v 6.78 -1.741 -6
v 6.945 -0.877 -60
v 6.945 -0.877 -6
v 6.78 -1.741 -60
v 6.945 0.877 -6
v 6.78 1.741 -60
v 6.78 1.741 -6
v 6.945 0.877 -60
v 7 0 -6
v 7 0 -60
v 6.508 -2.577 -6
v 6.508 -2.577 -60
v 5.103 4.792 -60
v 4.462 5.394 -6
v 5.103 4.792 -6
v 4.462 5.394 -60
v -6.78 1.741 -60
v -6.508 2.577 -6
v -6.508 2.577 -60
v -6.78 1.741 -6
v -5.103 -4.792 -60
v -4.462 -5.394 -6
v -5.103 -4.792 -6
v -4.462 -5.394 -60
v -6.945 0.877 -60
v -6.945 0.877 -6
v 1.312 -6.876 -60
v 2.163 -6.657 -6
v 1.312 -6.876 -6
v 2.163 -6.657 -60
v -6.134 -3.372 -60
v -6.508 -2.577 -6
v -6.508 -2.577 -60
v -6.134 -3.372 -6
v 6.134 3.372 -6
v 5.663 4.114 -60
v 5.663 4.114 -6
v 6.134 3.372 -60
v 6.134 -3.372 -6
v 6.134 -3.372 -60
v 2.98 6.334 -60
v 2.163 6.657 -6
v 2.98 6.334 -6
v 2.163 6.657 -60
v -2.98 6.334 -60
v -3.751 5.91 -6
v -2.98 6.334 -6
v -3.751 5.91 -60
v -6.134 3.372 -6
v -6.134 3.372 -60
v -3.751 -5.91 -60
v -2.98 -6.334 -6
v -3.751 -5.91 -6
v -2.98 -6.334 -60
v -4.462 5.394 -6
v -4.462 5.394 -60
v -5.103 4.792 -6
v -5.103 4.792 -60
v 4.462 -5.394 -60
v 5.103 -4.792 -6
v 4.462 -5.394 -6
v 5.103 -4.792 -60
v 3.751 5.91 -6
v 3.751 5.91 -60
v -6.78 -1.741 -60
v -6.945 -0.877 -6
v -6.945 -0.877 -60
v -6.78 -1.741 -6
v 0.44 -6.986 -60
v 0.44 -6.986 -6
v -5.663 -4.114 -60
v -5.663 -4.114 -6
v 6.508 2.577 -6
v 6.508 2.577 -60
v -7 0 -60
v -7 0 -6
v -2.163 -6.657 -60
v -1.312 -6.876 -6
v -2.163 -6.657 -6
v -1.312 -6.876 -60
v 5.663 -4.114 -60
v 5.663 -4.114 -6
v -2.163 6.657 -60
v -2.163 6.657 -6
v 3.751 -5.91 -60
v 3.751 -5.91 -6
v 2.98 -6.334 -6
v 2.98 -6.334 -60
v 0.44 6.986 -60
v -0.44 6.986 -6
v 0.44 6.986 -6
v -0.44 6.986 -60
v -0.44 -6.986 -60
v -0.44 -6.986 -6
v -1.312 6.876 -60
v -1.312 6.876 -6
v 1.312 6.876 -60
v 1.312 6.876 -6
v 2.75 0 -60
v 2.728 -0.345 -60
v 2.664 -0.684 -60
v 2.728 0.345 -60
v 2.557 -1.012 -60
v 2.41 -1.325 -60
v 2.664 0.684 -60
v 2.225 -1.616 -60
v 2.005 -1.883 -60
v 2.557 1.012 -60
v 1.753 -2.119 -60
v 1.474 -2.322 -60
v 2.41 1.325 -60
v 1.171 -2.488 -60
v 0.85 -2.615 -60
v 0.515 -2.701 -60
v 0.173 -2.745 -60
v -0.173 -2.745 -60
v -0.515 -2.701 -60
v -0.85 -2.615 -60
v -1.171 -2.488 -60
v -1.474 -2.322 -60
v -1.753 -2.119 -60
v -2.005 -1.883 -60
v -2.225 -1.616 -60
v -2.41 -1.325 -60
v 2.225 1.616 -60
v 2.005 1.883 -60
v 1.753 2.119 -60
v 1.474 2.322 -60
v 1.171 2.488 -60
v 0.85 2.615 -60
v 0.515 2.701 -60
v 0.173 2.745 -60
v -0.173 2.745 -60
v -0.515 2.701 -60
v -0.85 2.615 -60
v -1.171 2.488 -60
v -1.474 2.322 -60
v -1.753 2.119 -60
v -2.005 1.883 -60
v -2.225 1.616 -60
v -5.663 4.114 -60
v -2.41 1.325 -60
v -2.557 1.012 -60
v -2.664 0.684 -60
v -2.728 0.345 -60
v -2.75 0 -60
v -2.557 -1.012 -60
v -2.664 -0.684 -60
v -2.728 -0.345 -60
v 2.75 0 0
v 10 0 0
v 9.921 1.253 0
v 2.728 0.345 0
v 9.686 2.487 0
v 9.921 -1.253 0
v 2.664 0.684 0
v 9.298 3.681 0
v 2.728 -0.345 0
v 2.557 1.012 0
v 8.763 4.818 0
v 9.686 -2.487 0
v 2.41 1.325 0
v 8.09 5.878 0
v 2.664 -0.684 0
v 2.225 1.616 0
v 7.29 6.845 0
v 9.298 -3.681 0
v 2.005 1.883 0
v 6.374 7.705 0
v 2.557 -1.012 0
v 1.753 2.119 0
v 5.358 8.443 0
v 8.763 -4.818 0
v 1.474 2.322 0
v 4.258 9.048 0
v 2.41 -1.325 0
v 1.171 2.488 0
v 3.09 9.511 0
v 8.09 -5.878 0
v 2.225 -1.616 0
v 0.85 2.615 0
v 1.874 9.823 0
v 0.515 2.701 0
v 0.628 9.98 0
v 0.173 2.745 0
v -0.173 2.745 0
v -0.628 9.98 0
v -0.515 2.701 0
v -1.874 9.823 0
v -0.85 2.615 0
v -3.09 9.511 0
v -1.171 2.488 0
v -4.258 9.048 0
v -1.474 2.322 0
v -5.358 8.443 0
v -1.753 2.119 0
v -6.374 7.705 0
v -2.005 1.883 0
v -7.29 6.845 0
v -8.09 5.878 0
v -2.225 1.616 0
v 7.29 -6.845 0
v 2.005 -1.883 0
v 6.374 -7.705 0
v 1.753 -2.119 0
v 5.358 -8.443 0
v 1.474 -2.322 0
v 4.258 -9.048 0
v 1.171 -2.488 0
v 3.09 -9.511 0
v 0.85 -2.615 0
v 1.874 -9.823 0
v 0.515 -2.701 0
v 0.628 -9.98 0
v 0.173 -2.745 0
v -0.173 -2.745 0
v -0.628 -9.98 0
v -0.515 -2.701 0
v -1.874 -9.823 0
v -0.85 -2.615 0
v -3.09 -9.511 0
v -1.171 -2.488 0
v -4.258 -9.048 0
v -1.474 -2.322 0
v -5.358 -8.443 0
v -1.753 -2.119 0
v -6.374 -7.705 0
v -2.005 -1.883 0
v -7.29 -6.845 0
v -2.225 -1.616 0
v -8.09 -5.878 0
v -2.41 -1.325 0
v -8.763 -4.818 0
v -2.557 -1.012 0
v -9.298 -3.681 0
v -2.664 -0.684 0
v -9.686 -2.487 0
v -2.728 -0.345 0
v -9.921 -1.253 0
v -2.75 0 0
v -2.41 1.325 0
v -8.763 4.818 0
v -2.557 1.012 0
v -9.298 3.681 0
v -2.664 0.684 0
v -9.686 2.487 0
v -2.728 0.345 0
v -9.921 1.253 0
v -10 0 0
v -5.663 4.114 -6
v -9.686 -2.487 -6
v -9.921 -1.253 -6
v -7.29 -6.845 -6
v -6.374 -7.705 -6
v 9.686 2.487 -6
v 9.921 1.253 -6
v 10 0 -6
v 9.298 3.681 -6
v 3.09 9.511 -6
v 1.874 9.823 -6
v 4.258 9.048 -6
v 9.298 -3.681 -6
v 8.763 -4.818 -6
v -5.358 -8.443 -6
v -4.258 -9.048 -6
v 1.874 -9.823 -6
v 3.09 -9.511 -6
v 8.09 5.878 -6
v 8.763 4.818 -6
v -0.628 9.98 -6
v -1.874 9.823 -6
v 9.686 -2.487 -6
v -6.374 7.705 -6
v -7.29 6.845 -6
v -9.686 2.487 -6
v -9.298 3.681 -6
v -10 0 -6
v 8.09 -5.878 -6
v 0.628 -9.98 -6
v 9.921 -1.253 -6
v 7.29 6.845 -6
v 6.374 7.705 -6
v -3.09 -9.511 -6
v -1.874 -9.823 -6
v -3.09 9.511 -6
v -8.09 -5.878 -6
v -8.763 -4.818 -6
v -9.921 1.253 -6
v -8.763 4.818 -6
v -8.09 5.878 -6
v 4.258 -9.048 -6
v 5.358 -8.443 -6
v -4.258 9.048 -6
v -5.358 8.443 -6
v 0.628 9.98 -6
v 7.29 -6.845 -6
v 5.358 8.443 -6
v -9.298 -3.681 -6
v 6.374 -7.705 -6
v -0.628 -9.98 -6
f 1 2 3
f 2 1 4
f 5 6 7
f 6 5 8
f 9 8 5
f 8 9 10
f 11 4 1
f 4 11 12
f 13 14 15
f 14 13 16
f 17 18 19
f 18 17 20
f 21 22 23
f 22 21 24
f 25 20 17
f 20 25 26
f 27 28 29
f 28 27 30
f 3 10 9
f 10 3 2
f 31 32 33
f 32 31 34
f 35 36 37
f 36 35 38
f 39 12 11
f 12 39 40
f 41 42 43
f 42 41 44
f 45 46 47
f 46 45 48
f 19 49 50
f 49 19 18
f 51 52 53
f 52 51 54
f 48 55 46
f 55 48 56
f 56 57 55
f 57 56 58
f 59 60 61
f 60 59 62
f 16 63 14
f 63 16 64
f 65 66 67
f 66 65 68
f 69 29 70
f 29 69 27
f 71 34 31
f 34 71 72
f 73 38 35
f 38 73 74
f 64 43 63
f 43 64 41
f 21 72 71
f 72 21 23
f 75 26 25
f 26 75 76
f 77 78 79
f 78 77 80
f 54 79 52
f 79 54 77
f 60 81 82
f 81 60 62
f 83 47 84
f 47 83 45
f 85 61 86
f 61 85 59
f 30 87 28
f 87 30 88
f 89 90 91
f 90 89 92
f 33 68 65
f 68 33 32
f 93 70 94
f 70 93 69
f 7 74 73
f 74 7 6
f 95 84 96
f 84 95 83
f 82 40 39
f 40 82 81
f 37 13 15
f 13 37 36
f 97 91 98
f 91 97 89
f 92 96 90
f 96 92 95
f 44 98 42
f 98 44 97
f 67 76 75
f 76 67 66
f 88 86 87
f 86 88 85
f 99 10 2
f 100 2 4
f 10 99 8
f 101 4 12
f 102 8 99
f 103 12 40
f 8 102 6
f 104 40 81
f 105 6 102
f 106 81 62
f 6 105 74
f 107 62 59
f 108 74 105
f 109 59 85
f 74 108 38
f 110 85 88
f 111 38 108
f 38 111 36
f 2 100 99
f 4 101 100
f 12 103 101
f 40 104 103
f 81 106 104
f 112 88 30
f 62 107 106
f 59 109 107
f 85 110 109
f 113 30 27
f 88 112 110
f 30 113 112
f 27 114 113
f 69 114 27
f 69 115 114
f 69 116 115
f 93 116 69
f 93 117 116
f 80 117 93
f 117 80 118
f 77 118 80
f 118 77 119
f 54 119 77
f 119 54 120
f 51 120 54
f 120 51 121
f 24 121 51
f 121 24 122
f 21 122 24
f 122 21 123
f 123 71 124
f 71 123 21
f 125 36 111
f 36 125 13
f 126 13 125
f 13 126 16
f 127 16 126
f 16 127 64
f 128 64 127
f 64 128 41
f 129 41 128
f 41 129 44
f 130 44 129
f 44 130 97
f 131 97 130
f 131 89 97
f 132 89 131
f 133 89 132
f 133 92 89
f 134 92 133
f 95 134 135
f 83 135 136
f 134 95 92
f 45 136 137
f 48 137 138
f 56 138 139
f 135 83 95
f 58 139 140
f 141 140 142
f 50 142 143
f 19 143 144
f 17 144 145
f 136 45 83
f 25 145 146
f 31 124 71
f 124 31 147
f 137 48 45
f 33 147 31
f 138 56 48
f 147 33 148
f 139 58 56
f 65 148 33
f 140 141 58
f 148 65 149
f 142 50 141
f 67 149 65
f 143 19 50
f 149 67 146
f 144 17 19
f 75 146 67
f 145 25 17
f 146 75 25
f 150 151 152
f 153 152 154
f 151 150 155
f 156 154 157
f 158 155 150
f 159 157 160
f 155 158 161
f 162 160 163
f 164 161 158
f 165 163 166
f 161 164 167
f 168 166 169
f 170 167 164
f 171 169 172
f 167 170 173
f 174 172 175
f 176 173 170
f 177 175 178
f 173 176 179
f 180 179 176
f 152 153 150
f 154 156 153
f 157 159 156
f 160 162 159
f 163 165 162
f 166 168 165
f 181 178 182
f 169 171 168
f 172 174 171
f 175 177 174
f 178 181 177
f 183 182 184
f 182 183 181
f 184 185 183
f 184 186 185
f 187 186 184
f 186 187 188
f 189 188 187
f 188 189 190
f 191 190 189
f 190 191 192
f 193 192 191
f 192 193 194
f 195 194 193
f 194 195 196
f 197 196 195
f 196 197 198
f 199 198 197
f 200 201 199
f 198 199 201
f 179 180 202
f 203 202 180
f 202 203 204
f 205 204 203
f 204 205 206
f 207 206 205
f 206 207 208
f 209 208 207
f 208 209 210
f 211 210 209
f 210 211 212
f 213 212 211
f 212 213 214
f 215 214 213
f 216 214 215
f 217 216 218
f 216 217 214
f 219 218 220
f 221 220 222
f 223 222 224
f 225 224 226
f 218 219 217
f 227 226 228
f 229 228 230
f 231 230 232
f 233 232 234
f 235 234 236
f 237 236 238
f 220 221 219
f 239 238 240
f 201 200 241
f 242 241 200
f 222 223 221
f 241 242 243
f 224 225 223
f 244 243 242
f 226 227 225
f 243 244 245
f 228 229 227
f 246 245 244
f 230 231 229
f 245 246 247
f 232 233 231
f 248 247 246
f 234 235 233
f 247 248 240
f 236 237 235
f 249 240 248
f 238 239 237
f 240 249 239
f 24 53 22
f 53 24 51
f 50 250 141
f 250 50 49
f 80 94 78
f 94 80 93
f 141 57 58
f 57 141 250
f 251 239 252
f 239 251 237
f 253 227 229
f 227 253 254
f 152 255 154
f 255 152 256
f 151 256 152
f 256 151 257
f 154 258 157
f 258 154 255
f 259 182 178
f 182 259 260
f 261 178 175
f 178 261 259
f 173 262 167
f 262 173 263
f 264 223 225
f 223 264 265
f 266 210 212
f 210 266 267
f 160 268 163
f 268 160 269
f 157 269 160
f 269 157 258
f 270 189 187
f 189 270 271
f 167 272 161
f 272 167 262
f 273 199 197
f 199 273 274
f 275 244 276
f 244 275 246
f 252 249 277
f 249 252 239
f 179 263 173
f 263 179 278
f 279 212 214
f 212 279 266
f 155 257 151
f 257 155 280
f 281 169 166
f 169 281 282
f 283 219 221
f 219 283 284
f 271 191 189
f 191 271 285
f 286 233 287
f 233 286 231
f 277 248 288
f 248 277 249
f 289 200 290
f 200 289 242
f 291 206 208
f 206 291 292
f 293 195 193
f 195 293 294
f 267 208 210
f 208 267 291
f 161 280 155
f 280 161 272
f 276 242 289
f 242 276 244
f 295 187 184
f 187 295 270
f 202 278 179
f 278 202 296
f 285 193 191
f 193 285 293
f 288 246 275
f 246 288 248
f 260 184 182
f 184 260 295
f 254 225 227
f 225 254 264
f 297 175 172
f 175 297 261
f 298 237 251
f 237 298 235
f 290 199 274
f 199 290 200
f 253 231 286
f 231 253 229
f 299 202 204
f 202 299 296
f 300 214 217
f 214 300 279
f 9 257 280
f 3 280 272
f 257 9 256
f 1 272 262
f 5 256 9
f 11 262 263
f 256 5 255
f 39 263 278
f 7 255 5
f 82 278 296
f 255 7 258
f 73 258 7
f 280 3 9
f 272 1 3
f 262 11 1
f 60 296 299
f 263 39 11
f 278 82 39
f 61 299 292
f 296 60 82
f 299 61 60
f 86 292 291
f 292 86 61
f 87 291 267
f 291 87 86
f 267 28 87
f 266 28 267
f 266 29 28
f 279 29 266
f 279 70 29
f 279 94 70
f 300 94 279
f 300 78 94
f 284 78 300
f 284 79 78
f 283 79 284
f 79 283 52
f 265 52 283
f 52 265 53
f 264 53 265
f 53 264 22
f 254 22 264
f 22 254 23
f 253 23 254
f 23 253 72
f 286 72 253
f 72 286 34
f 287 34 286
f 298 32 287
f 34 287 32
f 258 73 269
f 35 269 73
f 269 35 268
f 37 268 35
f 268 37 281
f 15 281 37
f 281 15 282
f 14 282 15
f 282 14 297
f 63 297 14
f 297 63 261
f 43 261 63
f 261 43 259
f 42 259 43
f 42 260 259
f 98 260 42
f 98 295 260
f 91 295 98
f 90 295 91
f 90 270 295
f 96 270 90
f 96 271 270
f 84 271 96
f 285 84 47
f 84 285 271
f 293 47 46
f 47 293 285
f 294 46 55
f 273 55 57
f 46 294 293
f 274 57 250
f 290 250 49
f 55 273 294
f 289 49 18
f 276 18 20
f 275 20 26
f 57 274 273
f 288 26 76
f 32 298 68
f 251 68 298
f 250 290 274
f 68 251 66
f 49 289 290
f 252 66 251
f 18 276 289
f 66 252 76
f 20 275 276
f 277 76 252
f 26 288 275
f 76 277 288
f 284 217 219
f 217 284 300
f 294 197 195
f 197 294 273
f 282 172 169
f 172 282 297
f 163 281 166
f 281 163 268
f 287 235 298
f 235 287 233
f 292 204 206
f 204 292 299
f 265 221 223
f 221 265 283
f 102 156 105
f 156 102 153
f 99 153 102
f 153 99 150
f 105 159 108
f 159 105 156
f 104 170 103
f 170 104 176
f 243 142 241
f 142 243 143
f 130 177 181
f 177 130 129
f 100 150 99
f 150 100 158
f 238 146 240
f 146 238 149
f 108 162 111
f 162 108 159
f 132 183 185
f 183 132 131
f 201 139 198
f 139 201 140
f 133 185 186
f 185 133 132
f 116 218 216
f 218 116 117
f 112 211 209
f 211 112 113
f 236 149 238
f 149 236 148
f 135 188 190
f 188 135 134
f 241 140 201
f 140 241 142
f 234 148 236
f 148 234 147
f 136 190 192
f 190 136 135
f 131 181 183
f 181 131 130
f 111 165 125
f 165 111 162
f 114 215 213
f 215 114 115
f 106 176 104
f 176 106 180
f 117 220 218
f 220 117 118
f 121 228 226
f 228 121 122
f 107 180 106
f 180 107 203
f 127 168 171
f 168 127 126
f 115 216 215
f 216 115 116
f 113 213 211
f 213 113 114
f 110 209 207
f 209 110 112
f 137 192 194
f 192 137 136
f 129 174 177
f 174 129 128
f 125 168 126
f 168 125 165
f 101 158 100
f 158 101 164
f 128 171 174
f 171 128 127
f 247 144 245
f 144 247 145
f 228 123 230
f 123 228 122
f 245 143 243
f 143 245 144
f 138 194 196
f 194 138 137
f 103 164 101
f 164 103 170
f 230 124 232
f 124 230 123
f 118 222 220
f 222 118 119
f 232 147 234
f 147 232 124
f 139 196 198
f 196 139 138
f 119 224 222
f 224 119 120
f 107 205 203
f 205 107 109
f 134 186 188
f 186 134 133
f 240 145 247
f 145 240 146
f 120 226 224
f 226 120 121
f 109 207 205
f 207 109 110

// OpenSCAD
$fn = 50;


difference() {
	union() {
		translate(v = [0, 0, -60.0000000000]) {
			cylinder(h = 60, r = 7.0000000000);
		}
		translate(v = [0, 0, -6.0000000000]) {
			cylinder(h = 6, r = 10.0000000000);
		}
	}
	union() {
		#translate(v = [0, 0, -60]) {
			cylinder(h = 60, r = 2.7500000000);
		}
	}
}
